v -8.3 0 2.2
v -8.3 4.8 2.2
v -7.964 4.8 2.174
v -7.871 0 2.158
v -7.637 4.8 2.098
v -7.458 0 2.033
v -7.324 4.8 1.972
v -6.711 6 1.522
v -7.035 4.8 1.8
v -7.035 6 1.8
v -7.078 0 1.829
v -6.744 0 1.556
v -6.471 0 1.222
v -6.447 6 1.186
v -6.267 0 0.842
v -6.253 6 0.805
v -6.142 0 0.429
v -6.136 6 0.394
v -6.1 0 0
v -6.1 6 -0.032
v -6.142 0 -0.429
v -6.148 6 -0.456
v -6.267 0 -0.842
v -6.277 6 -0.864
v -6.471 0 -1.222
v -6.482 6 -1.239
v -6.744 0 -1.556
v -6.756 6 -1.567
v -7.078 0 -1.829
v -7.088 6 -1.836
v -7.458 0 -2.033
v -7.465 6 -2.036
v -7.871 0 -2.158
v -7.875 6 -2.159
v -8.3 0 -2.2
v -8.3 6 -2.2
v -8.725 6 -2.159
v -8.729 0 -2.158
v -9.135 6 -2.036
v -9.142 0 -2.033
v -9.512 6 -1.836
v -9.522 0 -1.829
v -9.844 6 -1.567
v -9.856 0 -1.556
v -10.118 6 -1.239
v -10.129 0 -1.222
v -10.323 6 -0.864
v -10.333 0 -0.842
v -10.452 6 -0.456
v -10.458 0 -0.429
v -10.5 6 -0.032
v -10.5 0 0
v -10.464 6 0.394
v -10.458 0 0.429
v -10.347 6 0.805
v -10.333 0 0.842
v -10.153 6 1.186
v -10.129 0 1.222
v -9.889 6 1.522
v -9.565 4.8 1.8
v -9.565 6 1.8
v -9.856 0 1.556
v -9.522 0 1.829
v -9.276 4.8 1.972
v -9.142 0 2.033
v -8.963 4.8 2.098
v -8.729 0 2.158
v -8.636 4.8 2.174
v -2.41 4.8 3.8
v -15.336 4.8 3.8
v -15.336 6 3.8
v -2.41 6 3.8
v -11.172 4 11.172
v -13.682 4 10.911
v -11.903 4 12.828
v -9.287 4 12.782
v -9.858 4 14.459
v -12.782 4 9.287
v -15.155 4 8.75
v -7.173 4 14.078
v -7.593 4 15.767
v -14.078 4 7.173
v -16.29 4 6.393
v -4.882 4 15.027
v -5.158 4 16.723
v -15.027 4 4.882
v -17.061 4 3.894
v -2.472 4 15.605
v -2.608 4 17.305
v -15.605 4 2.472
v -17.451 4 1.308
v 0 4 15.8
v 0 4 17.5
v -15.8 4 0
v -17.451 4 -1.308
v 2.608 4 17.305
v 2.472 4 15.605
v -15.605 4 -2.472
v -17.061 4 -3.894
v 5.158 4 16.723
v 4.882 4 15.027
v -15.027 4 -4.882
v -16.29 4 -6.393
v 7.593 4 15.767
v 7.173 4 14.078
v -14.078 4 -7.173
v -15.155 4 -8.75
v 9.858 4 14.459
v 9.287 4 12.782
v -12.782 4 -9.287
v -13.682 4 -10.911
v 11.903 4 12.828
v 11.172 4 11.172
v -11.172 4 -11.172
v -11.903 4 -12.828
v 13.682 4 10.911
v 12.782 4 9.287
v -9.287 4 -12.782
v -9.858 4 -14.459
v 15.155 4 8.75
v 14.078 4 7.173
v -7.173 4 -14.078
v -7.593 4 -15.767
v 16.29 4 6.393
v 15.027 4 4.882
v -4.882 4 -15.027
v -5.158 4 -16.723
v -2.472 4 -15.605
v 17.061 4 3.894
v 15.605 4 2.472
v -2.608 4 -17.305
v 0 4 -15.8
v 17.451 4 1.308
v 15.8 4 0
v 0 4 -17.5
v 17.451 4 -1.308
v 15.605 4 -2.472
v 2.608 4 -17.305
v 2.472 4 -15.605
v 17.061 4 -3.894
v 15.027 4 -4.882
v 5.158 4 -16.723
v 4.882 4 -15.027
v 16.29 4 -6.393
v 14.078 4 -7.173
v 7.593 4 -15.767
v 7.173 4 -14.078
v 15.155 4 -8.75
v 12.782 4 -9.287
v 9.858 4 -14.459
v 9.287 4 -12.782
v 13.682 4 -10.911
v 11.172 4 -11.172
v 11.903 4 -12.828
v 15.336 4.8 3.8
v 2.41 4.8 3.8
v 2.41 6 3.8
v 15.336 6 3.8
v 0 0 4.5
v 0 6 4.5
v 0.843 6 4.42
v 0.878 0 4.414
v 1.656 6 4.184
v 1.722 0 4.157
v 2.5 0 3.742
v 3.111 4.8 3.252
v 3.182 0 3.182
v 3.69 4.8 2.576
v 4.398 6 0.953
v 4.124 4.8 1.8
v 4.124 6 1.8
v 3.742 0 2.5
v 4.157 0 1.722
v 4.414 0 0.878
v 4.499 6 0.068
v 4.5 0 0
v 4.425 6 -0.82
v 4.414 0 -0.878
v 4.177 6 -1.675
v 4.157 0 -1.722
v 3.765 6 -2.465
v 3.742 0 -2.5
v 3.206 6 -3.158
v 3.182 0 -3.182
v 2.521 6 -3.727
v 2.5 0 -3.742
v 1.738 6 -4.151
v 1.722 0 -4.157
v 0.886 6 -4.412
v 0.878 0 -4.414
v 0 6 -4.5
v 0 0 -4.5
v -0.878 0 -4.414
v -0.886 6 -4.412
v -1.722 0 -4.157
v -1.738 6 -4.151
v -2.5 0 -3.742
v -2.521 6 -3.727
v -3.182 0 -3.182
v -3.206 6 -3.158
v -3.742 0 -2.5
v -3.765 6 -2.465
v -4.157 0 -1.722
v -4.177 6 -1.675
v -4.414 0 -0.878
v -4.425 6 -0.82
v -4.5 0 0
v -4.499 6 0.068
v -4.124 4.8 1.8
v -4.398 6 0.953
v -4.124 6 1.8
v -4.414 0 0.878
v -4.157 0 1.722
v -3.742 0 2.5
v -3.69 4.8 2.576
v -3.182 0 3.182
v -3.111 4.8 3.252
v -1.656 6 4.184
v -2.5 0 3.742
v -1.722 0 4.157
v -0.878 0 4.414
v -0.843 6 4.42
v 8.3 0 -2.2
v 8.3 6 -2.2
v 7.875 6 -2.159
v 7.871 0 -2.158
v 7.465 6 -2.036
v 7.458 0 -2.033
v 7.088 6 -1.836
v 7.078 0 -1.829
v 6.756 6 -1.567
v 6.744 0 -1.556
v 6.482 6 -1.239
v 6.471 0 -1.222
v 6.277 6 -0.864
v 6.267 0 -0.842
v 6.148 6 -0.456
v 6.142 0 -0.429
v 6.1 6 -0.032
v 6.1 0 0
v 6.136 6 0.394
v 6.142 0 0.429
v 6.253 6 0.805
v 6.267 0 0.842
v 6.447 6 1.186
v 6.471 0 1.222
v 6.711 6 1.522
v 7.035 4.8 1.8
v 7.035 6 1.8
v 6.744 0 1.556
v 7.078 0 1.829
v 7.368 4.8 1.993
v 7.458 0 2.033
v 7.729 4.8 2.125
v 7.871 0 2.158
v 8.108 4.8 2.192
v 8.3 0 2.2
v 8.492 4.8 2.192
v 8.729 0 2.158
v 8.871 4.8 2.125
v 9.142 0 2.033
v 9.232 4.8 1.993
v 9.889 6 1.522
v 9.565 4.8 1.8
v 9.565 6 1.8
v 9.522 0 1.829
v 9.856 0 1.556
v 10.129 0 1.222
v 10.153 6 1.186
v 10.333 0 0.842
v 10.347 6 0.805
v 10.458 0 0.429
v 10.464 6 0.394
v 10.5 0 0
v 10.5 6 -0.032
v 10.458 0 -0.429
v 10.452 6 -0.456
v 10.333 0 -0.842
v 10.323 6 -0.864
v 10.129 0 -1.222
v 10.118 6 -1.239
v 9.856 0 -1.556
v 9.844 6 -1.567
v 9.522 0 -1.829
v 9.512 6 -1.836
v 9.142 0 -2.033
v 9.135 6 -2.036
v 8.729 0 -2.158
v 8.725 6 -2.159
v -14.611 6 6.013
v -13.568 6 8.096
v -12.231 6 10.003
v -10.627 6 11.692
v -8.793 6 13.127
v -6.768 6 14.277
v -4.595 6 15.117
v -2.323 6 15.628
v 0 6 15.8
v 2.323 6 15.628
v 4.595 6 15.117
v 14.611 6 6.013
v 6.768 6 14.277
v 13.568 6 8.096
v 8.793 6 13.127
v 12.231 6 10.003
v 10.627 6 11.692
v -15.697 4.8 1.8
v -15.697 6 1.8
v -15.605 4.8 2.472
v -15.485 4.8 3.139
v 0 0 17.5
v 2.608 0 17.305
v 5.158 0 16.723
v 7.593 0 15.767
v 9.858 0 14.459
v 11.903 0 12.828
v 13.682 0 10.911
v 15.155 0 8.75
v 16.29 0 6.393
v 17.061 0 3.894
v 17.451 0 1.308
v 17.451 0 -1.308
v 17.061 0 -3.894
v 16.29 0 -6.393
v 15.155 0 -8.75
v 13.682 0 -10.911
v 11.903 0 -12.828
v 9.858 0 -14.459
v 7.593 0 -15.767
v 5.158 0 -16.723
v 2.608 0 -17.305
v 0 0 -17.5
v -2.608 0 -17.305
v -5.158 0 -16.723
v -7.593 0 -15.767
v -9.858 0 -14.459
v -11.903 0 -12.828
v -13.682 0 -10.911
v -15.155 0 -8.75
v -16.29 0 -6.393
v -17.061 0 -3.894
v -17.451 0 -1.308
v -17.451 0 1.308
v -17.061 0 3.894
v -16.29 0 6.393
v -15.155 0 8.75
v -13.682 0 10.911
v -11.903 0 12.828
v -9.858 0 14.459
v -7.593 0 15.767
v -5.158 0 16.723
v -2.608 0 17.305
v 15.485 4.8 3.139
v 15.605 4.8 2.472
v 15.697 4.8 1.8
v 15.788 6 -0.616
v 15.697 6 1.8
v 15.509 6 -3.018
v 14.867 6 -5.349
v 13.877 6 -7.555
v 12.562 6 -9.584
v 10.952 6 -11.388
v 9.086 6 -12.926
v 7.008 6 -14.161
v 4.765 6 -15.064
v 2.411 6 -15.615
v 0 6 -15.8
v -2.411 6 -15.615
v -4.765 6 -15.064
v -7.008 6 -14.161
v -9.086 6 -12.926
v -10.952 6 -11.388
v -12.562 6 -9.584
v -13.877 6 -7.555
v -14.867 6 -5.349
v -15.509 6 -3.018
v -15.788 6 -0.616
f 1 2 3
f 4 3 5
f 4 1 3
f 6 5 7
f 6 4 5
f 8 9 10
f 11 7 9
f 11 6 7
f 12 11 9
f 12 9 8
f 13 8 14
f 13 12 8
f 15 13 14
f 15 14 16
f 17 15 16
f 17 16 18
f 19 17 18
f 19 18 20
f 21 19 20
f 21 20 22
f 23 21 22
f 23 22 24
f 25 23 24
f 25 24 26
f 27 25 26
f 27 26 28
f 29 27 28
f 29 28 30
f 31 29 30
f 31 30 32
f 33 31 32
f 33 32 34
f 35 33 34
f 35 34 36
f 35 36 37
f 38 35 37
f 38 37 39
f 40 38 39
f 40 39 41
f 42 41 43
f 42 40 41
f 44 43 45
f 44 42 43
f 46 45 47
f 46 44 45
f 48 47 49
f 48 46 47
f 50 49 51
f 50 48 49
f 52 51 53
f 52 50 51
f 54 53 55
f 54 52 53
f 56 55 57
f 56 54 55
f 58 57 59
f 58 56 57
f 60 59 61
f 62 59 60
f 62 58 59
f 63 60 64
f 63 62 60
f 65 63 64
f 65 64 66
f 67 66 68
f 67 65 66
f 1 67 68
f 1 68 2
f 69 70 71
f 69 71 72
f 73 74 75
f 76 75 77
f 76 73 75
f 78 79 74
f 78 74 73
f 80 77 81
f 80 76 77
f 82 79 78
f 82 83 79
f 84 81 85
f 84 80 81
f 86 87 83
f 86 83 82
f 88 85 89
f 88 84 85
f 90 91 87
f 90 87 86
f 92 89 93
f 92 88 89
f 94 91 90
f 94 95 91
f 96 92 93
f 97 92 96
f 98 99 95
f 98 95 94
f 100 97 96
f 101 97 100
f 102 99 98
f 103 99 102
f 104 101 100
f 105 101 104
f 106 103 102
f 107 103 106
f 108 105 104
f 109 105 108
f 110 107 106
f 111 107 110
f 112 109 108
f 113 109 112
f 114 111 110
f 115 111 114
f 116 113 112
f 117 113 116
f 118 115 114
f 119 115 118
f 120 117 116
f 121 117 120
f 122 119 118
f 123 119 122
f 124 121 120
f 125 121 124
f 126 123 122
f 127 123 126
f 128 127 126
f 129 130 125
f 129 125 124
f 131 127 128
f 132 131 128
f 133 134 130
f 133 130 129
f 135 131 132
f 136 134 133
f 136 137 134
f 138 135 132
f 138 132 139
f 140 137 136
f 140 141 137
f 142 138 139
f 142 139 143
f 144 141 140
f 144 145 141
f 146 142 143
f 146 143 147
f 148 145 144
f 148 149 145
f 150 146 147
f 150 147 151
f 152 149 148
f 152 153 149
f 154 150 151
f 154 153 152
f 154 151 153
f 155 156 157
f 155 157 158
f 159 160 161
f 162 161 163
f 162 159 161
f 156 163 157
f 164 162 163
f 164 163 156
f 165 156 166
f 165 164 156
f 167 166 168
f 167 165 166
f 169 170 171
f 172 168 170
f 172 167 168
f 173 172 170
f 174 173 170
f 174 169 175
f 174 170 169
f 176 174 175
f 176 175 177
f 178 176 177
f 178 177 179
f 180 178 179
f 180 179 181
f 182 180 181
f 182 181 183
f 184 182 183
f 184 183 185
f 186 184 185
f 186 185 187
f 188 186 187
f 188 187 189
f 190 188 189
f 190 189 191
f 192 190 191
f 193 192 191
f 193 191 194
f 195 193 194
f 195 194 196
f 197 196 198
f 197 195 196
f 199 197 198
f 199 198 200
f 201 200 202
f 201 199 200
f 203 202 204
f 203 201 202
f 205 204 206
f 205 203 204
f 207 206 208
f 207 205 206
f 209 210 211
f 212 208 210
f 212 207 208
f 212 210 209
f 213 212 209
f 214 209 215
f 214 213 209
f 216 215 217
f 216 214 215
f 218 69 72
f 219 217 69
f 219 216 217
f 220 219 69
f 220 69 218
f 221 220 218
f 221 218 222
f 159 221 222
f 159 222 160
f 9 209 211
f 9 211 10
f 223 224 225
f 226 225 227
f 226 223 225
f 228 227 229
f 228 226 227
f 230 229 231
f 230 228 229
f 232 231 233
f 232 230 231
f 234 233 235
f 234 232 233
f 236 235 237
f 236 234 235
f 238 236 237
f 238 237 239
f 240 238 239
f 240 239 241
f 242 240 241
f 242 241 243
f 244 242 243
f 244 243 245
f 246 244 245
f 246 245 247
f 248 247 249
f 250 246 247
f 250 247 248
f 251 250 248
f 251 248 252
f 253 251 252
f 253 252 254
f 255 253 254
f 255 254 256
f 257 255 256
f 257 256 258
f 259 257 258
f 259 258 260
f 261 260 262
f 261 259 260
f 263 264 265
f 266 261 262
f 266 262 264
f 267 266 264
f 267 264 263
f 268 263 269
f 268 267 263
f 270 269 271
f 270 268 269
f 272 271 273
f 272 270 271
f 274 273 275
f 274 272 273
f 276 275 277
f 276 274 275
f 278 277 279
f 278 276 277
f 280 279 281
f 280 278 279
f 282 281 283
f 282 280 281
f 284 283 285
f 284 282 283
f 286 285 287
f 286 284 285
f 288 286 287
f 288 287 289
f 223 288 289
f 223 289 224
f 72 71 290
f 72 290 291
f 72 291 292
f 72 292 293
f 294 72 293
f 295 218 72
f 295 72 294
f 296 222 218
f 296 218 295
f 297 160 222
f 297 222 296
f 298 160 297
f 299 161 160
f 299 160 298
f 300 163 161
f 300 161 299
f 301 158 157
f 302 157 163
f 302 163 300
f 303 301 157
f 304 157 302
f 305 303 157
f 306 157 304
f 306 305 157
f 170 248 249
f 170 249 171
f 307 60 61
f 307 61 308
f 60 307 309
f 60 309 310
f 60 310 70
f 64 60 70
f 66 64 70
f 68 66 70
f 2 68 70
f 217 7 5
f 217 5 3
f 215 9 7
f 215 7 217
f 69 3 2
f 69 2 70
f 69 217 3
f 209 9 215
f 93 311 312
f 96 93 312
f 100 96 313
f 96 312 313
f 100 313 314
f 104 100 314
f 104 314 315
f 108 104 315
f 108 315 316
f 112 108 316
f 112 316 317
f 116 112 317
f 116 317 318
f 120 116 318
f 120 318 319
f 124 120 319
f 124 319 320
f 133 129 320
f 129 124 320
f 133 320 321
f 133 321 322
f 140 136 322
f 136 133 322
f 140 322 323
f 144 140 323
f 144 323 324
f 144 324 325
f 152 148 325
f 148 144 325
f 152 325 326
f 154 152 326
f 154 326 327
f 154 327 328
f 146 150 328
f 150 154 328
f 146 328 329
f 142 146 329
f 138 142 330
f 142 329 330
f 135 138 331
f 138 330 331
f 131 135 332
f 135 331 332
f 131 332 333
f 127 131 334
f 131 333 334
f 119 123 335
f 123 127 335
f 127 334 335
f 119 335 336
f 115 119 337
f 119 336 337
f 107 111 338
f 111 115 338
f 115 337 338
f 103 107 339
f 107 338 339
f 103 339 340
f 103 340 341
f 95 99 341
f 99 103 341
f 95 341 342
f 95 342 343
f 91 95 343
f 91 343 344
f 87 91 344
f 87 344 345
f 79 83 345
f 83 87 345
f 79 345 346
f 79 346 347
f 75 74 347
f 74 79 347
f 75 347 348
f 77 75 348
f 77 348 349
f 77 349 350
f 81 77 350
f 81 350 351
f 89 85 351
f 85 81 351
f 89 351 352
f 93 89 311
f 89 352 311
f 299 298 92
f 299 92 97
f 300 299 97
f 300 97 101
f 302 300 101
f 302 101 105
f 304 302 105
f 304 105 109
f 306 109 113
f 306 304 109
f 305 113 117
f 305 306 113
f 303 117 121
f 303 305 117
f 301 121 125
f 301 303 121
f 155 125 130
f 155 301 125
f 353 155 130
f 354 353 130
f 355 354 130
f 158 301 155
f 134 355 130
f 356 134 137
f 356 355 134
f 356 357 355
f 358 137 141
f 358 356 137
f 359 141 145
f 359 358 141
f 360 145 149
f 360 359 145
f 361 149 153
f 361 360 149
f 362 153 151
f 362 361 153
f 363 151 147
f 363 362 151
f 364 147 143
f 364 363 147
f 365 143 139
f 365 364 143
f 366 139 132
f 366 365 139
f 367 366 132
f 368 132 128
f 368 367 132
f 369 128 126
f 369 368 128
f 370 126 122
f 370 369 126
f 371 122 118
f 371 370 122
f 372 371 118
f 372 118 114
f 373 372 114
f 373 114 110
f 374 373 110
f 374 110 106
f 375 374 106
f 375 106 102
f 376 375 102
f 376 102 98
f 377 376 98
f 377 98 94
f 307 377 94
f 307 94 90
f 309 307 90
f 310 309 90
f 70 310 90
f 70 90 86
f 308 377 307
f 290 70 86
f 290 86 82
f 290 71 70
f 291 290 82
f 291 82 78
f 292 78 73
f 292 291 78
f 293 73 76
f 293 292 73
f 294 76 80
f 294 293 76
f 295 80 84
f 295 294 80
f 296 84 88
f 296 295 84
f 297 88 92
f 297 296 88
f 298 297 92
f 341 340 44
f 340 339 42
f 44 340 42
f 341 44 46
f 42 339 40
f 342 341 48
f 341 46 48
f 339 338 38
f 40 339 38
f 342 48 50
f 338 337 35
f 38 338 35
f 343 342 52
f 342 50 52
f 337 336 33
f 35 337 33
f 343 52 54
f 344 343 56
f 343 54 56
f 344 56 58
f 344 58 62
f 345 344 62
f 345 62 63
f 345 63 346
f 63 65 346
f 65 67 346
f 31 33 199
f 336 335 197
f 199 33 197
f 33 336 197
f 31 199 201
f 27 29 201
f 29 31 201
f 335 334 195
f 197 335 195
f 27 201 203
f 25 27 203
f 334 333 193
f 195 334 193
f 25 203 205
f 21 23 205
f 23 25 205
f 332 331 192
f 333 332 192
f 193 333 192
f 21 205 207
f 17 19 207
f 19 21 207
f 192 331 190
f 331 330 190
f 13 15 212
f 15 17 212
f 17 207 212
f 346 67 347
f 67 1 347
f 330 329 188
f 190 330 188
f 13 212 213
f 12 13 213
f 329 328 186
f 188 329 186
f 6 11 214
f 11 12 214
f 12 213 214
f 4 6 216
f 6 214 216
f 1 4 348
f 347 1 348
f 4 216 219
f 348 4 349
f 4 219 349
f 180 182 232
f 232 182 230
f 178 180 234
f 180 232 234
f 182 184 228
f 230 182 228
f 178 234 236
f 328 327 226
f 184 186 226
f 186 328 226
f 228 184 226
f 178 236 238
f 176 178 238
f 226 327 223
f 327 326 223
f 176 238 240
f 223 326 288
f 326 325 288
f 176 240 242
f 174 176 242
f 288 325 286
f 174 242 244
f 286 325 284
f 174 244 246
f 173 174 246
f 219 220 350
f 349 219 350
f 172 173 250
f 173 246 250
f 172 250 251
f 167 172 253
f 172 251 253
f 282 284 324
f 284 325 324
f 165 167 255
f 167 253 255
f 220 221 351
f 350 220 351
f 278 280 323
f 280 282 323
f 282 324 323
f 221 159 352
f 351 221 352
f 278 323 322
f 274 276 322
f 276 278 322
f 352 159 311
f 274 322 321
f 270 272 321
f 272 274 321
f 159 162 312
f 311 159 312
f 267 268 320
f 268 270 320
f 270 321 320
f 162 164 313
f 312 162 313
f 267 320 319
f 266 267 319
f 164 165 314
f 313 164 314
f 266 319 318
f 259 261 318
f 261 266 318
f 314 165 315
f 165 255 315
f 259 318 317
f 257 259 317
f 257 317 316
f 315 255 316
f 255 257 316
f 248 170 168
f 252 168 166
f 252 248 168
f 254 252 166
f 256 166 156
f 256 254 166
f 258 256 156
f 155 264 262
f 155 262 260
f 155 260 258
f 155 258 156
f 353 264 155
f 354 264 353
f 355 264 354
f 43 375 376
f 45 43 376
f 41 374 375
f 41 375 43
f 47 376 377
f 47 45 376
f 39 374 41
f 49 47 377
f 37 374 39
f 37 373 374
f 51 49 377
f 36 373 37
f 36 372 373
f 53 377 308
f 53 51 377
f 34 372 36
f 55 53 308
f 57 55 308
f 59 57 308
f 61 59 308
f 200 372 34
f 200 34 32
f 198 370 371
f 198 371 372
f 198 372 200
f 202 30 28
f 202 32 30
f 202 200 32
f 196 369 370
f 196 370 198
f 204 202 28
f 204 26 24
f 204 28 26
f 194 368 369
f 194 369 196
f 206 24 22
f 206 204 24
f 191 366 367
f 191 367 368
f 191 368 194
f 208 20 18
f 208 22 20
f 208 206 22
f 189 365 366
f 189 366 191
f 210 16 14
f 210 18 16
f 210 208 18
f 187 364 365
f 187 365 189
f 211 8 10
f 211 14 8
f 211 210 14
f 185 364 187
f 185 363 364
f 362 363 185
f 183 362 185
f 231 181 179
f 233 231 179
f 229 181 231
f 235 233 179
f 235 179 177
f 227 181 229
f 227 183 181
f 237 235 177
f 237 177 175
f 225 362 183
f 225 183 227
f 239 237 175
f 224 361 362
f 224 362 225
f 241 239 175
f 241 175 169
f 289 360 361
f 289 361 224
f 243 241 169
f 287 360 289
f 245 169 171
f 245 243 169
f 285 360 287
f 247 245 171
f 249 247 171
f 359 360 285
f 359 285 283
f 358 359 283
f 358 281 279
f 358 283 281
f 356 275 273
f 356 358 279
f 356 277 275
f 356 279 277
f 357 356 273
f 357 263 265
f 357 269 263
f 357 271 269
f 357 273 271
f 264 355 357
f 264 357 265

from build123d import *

# Parameters (mm, degrees)
SKETCH2_R           = 17.5
SKETCH2_R_2         = 4.5
SKETCH2_R_3         = 2.2
BOSS_EXTRUDE2_DEPTH = 6
SKETCH3_OUTSIDE_W   = 46.972
SKETCH3_OUTSIDE_H   = 46.972
SKETCH3_OUTSIDE_R   = 15.8
CUT_EXTRUDE1_DEPTH  = 2
CUT_EXTRUDE3_START  = -1.2
CUT_EXTRUDE3_DEPTH  = 1.2


with BuildPart() as part:
    # Sketch2 → Boss-Extrude2 (new body)
    with BuildSketch(Plane(origin=(0, 0, 0), x_dir=(1, 0, 0), z_dir=(0, 1, 0))):
        with Locations(Location((0, 0, 0), (0, 0, 270))):
            Circle(SKETCH2_R)
        with Locations(Location((0, 0, 0), (0, 0, 270))):
            Circle(SKETCH2_R_2, mode=Mode.SUBTRACT)
        with Locations(Location((-8.3, 0, 0), (0, 0, 270))):
            Circle(SKETCH2_R_3, mode=Mode.SUBTRACT)
        with Locations(Location((8.3, 0, 0), (0, 0, 90))):
            Circle(SKETCH2_R_3, mode=Mode.SUBTRACT)
    extrude(amount=BOSS_EXTRUDE2_DEPTH)

    # Sketch3 outside → Cut-Extrude1 (cut)
    with BuildSketch(Plane(origin=(0, 6, 0), x_dir=(1, 0, 0), z_dir=(0, 1, 0))):
        Rectangle(SKETCH3_OUTSIDE_W, SKETCH3_OUTSIDE_H)
        with Locations(Location((0, 0, 0), (0, 0, 270))):
            Circle(SKETCH3_OUTSIDE_R, mode=Mode.SUBTRACT)
    extrude(amount=-CUT_EXTRUDE1_DEPTH, mode=Mode.SUBTRACT)

    # Sketch4 → Cut-Extrude3 (cut)
    with BuildSketch(Plane(origin=(0, 6, 0), x_dir=(1, 0, 0), z_dir=(0, 1, 0)).offset(CUT_EXTRUDE3_START)):
        with BuildLine():
            Line((-9.564911064, -1.8), (-15.697133496, -1.8))
            ThreePointArc((-15.697133496, -1.8), (-15.548872546, -2.805808715), (-15.33623161, -3.8))
            Line((-15.33623161, -3.8), (-2.410394159, -3.8))
            ThreePointArc((-2.410394159, -3.8), (-3.416960076, -2.928204884), (-4.124318125, -1.8))
            Line((-4.124318125, -1.8), (-7.035088936, -1.8))
            ThreePointArc((-7.035088936, -1.8), (-8.3, -2.2), (-9.564911064, -1.8))
        make_face()
        with BuildLine():
            ThreePointArc((15.33623161, -3.8), (15.548872546, -2.805808715), (15.697133496, -1.8))
            Line((15.697133496, -1.8), (9.564911064, -1.8))
            ThreePointArc((9.564911064, -1.8), (8.3, -2.2), (7.035088936, -1.8))
            Line((7.035088936, -1.8), (4.124318125, -1.8))
            ThreePointArc((4.124318125, -1.8), (3.416960076, -2.928204884), (2.410394159, -3.8))
            Line((2.410394159, -3.8), (15.33623161, -3.8))
        make_face()
    extrude(amount=CUT_EXTRUDE3_DEPTH, mode=Mode.SUBTRACT)


solid = part.part
